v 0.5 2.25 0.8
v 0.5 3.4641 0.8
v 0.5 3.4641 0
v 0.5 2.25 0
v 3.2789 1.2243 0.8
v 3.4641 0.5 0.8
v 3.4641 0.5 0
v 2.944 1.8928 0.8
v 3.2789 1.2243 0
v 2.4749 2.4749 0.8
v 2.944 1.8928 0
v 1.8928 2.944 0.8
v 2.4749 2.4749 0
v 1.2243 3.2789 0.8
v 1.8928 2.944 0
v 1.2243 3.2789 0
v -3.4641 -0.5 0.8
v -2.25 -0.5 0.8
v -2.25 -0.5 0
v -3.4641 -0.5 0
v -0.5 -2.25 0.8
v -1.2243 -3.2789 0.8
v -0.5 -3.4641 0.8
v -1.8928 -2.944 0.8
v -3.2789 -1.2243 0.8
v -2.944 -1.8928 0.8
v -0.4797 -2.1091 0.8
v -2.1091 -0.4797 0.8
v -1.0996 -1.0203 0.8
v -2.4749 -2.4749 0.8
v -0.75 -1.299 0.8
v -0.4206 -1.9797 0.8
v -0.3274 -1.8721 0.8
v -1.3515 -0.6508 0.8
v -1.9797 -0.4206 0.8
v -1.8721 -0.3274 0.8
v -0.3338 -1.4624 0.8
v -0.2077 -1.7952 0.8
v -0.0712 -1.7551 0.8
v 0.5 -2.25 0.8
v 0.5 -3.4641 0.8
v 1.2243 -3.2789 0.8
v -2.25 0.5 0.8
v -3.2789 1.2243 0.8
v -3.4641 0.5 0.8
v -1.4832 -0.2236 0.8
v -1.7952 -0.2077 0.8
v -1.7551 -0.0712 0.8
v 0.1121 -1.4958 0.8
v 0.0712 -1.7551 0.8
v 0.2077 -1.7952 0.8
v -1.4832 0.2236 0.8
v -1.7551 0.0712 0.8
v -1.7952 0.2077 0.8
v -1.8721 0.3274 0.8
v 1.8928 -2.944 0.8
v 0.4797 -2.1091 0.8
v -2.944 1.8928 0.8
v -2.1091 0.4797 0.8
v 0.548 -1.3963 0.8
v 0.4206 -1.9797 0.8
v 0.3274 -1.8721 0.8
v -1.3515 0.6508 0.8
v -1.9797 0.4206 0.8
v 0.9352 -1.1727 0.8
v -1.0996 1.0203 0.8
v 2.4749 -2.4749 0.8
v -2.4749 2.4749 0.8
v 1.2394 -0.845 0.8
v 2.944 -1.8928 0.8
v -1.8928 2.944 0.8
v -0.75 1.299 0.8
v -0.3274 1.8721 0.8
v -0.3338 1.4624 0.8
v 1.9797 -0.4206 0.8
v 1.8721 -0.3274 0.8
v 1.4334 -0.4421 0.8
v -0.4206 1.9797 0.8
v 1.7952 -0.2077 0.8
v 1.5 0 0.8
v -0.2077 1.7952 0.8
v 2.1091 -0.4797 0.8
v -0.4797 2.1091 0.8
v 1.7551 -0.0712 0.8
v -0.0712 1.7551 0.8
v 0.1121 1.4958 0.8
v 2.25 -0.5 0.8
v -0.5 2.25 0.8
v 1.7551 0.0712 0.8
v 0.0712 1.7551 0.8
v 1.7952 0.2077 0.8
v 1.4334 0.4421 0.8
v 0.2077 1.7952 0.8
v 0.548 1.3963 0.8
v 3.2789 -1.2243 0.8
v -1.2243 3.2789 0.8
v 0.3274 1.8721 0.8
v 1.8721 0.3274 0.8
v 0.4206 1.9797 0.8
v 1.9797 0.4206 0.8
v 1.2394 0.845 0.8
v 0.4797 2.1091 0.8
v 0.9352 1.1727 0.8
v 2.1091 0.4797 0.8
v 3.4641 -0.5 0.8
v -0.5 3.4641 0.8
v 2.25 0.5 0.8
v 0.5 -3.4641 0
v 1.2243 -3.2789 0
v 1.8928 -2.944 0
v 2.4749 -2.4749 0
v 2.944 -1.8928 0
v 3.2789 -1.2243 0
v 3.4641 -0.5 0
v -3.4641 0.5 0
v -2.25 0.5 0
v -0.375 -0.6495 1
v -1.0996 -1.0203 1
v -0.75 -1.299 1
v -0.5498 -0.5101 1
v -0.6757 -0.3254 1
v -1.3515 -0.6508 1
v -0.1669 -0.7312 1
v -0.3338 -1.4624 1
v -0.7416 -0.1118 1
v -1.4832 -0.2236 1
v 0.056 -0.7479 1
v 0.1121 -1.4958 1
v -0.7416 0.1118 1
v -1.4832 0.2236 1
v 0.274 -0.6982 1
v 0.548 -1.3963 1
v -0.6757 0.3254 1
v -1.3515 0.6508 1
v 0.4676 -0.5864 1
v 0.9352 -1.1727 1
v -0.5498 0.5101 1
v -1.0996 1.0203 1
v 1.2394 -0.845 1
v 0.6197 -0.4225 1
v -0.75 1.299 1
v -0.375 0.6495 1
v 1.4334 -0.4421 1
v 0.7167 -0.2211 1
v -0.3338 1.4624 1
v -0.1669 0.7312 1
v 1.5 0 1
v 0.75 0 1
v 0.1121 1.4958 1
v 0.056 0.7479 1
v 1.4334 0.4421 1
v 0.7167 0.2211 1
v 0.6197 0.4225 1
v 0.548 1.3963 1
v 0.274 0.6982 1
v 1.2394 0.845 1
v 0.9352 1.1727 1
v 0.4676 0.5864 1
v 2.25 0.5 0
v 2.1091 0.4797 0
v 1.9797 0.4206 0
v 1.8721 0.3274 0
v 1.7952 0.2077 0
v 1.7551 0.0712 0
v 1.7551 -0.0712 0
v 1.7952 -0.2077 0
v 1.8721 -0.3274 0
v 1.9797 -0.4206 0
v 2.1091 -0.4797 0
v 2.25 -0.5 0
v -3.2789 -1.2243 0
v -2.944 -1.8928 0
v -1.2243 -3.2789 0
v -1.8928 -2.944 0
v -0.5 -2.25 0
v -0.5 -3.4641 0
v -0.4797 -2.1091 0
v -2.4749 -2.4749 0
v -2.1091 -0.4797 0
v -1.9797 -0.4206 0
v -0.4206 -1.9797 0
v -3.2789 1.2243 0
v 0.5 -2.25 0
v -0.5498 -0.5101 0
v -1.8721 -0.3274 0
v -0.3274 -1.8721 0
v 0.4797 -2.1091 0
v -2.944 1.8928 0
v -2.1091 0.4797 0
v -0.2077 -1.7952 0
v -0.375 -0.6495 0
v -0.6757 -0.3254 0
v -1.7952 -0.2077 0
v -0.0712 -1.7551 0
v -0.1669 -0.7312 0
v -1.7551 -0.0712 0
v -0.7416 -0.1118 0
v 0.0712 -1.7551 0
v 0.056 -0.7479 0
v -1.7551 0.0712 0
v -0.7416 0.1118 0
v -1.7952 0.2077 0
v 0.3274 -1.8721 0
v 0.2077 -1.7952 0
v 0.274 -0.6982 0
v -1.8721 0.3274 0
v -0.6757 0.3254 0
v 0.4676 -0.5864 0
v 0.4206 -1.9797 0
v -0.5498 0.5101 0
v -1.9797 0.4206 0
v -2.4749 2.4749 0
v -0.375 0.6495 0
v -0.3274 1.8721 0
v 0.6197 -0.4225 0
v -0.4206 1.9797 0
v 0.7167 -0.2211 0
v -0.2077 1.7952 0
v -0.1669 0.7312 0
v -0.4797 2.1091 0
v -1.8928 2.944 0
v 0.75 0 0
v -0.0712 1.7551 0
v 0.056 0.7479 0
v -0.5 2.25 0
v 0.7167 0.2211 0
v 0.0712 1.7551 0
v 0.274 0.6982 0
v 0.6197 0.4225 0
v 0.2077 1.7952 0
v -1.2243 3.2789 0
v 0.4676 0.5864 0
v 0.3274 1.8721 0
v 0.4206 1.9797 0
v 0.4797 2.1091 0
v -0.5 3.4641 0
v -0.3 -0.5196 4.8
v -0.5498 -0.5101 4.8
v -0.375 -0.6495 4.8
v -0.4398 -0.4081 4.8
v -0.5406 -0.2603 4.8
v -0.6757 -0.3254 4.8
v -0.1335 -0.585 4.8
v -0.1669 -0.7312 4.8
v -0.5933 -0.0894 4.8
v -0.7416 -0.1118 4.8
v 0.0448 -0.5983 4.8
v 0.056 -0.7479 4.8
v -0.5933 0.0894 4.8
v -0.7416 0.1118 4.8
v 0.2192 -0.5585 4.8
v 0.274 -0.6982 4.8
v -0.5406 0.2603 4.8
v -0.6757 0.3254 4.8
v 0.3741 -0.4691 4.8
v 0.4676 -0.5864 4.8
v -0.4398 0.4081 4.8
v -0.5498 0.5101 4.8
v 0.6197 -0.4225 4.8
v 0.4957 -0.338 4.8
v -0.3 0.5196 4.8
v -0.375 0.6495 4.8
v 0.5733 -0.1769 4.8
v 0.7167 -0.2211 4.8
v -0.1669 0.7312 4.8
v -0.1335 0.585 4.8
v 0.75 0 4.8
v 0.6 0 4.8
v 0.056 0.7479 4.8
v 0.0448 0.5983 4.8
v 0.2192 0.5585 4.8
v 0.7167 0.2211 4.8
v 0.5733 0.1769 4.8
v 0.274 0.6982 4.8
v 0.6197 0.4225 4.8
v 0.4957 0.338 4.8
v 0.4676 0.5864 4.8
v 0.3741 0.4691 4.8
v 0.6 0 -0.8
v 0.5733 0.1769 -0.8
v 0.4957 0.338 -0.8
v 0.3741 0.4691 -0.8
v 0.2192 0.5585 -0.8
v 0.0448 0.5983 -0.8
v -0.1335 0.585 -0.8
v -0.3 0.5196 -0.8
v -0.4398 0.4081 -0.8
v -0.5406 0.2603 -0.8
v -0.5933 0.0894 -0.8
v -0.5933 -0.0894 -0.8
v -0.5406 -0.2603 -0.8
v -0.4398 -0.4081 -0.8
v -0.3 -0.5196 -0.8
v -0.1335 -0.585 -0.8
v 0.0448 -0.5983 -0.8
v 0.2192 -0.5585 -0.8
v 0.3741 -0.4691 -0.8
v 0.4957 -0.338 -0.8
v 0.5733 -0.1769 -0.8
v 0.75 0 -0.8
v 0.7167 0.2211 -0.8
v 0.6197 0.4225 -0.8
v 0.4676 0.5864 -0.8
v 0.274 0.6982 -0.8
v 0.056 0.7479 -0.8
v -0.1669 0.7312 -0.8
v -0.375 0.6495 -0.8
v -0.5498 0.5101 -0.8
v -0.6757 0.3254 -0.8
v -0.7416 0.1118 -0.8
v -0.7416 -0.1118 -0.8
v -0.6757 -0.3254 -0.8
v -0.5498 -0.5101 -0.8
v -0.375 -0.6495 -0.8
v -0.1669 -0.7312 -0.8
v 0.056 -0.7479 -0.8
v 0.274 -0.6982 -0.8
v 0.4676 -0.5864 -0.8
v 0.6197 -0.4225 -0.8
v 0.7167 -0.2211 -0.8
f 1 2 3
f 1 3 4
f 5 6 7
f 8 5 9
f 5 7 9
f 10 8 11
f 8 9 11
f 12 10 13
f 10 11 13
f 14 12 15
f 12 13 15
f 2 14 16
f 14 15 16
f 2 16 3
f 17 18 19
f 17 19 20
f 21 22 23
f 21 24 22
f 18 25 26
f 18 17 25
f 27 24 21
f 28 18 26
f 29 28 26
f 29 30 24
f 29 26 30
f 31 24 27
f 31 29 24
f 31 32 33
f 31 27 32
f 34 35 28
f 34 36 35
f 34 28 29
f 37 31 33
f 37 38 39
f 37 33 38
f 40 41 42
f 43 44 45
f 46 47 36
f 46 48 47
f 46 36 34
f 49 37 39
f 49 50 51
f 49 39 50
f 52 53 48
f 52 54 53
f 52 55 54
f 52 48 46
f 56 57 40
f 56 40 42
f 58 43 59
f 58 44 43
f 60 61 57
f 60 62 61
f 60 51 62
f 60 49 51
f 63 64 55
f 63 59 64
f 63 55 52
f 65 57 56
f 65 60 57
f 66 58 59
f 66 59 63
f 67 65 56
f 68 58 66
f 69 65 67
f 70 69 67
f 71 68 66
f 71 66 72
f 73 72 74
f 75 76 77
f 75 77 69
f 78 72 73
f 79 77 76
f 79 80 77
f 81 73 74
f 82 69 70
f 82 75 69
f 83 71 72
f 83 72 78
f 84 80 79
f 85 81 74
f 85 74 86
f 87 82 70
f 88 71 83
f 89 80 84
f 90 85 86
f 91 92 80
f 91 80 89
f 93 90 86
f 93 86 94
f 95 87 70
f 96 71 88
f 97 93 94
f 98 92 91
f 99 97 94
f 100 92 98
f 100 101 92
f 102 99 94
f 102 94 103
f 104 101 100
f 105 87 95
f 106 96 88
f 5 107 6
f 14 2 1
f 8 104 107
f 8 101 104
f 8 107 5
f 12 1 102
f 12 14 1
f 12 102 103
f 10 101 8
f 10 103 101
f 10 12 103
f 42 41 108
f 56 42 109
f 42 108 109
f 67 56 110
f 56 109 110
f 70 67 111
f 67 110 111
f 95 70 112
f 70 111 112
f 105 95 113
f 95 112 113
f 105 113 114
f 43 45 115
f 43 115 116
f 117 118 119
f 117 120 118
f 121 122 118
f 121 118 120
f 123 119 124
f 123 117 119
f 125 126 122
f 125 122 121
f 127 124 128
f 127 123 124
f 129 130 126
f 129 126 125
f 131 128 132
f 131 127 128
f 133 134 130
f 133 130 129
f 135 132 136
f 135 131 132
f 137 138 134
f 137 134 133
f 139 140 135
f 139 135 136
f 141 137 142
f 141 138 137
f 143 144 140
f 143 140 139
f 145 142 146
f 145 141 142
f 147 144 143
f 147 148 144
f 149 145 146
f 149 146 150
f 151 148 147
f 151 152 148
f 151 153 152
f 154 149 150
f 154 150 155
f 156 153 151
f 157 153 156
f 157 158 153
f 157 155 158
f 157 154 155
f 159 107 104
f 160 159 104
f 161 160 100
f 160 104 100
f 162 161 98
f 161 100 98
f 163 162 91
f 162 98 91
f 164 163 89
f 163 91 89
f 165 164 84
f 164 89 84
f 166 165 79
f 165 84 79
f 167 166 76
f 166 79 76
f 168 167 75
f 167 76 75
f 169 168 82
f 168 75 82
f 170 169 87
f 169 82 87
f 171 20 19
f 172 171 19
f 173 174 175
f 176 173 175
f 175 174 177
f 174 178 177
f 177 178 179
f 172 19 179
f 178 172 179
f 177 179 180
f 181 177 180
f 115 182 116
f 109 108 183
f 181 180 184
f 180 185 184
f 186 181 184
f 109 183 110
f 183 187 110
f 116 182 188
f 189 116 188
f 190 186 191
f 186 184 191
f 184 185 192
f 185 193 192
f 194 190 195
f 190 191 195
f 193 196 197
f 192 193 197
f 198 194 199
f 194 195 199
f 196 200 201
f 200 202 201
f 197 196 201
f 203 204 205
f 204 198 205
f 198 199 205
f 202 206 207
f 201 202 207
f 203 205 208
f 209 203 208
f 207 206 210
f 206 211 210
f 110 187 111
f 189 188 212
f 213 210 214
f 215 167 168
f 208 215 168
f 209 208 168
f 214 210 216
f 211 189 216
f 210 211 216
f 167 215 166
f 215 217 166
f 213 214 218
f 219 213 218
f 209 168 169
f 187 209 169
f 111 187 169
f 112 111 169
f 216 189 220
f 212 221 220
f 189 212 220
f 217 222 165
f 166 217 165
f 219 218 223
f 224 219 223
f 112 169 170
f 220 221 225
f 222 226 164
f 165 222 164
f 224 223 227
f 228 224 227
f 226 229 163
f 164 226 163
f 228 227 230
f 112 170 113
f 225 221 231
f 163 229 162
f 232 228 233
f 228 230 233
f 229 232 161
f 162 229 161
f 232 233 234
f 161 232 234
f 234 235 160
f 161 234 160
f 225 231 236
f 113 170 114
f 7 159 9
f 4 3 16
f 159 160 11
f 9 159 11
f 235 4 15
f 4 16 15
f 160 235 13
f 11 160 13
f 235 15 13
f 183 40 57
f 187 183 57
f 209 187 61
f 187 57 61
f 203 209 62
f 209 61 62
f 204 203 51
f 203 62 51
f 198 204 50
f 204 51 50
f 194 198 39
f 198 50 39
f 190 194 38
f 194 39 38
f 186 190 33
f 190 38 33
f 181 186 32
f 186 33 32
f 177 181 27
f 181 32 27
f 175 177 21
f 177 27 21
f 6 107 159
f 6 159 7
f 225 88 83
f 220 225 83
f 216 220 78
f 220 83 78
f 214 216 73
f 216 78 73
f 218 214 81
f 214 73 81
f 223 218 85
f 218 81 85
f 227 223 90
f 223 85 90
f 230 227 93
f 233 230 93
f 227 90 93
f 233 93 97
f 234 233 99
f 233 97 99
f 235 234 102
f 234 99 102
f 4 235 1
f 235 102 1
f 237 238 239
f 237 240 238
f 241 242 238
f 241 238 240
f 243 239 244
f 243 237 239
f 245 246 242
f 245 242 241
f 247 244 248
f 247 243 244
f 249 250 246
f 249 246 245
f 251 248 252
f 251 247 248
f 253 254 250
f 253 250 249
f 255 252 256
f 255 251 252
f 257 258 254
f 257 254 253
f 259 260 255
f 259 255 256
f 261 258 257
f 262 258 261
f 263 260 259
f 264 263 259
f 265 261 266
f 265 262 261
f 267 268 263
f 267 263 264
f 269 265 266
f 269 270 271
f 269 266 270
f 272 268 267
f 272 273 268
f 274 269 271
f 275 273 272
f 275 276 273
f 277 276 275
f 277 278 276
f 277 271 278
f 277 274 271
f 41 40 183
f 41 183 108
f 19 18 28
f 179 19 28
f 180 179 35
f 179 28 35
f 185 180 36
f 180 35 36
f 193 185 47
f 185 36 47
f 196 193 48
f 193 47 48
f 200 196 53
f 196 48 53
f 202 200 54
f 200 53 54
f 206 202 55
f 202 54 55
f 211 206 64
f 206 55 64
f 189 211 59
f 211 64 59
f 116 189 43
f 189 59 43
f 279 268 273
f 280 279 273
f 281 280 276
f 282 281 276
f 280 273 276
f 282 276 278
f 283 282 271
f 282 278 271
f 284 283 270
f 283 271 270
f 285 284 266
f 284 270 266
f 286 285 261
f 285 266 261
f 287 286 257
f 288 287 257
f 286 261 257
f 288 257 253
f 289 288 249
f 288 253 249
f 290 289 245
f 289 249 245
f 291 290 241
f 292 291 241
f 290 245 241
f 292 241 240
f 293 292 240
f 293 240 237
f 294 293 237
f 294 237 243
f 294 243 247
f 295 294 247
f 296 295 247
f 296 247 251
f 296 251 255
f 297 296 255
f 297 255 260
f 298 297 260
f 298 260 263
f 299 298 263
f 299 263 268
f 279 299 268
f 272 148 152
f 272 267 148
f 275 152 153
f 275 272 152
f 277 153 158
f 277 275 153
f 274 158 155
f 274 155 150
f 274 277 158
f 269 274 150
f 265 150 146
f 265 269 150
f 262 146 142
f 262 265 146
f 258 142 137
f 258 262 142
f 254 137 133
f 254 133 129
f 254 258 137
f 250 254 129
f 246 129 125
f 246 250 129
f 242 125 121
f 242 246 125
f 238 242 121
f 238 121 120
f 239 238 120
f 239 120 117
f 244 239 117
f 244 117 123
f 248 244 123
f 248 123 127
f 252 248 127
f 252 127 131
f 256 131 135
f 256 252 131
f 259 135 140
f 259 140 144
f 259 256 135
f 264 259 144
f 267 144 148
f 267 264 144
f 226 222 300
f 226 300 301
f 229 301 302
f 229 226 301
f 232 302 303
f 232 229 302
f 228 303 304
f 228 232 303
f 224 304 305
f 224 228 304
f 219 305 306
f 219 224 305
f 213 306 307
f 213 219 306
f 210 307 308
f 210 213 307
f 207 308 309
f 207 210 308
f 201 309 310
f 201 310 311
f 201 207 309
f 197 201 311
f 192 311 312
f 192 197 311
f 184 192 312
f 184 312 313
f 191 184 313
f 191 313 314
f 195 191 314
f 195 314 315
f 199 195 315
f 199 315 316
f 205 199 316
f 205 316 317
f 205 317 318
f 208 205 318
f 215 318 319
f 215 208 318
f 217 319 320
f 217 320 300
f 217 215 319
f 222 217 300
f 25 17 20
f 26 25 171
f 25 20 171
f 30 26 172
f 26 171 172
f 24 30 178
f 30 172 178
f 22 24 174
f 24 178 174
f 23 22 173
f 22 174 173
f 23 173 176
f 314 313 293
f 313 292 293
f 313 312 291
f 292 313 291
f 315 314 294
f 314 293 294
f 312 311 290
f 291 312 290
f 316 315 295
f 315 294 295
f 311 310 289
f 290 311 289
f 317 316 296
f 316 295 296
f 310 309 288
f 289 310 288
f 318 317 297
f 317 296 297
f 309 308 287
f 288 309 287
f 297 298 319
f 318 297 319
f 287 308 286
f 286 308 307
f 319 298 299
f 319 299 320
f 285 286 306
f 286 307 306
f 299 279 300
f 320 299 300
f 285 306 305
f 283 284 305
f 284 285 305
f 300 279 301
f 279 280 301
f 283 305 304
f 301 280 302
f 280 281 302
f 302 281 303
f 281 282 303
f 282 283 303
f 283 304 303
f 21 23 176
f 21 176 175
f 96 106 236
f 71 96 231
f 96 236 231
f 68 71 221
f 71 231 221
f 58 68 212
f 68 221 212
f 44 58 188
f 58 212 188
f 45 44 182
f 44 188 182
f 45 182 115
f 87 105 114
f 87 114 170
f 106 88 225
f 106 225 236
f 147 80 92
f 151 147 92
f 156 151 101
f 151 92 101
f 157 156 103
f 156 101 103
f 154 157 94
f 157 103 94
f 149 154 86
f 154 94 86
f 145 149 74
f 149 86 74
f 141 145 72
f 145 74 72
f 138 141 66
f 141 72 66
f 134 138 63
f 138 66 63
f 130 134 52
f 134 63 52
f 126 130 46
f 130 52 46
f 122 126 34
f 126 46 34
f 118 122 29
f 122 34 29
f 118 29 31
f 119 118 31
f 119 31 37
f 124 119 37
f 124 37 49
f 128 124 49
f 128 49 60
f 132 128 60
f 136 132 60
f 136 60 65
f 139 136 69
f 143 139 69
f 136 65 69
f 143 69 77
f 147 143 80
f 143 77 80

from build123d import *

# Parameters (mm, degrees)
SKETCH_R           = 0.75
SKETCH_R_2         = 0.6
PAD_DEPTH          = 4.8
PAD_DEPTH_BACK     = 0.8
SKETCH001_R        = 3.5
SKETCH001_R_2      = 0.6
PAD001_DEPTH       = 0.8
POCKET_DEPTH       = 24.348308
POLARPATTERN_COUNT = 4
SKETCH003_R        = 1.5
SKETCH003_R_2      = 0.6
PAD002_DEPTH       = 0.2


with BuildPart() as part:
    # Sketch → Pad (new body, two sides)
    with BuildSketch(Plane.XY) as pad_sk:
        Circle(SKETCH_R)
        Circle(SKETCH_R_2, mode=Mode.SUBTRACT)
    extrude(amount=PAD_DEPTH)
    extrude(pad_sk.sketch, amount=-PAD_DEPTH_BACK)

    # Sketch001 → Pad001 (join)
    with BuildSketch(Plane.XY):
        Circle(SKETCH001_R)
        Circle(SKETCH001_R_2, mode=Mode.SUBTRACT)
    extrude(amount=PAD001_DEPTH)

    # Sketch002 (on Face8 of Pad001) → Pocket (cut, through all)
    with BuildSketch(Plane.XY.offset(0.8)):
        with BuildLine():
            Line((-0.5, 3.75), (0.5, 3.75))
            Line((0.5, 3.75), (0.5, 2.25))
            ThreePointArc((-0.5, 2.25), (0, 1.75), (0.5, 2.25))
            Line((-0.5, 2.25), (-0.5, 3.75))
        make_face()
    pocket = extrude(amount=-POCKET_DEPTH, mode=Mode.SUBTRACT)

    # PolarPattern: Pocket ×4 about axis
    polarpattern_axis = Axis((0, 0, 0.8), (0, 0, 1))
    for i in range(1, POLARPATTERN_COUNT):
        add(pocket.rotate(polarpattern_axis, i * 360 / POLARPATTERN_COUNT), mode=Mode.SUBTRACT)

    # Sketch003 (on Face23 of PolarPattern) → Pad002 (join)
    with BuildSketch(Plane.XY.offset(0.8)):
        Circle(SKETCH003_R)
        Circle(SKETCH003_R_2, mode=Mode.SUBTRACT)
    extrude(amount=PAD002_DEPTH)


solid = part.part
